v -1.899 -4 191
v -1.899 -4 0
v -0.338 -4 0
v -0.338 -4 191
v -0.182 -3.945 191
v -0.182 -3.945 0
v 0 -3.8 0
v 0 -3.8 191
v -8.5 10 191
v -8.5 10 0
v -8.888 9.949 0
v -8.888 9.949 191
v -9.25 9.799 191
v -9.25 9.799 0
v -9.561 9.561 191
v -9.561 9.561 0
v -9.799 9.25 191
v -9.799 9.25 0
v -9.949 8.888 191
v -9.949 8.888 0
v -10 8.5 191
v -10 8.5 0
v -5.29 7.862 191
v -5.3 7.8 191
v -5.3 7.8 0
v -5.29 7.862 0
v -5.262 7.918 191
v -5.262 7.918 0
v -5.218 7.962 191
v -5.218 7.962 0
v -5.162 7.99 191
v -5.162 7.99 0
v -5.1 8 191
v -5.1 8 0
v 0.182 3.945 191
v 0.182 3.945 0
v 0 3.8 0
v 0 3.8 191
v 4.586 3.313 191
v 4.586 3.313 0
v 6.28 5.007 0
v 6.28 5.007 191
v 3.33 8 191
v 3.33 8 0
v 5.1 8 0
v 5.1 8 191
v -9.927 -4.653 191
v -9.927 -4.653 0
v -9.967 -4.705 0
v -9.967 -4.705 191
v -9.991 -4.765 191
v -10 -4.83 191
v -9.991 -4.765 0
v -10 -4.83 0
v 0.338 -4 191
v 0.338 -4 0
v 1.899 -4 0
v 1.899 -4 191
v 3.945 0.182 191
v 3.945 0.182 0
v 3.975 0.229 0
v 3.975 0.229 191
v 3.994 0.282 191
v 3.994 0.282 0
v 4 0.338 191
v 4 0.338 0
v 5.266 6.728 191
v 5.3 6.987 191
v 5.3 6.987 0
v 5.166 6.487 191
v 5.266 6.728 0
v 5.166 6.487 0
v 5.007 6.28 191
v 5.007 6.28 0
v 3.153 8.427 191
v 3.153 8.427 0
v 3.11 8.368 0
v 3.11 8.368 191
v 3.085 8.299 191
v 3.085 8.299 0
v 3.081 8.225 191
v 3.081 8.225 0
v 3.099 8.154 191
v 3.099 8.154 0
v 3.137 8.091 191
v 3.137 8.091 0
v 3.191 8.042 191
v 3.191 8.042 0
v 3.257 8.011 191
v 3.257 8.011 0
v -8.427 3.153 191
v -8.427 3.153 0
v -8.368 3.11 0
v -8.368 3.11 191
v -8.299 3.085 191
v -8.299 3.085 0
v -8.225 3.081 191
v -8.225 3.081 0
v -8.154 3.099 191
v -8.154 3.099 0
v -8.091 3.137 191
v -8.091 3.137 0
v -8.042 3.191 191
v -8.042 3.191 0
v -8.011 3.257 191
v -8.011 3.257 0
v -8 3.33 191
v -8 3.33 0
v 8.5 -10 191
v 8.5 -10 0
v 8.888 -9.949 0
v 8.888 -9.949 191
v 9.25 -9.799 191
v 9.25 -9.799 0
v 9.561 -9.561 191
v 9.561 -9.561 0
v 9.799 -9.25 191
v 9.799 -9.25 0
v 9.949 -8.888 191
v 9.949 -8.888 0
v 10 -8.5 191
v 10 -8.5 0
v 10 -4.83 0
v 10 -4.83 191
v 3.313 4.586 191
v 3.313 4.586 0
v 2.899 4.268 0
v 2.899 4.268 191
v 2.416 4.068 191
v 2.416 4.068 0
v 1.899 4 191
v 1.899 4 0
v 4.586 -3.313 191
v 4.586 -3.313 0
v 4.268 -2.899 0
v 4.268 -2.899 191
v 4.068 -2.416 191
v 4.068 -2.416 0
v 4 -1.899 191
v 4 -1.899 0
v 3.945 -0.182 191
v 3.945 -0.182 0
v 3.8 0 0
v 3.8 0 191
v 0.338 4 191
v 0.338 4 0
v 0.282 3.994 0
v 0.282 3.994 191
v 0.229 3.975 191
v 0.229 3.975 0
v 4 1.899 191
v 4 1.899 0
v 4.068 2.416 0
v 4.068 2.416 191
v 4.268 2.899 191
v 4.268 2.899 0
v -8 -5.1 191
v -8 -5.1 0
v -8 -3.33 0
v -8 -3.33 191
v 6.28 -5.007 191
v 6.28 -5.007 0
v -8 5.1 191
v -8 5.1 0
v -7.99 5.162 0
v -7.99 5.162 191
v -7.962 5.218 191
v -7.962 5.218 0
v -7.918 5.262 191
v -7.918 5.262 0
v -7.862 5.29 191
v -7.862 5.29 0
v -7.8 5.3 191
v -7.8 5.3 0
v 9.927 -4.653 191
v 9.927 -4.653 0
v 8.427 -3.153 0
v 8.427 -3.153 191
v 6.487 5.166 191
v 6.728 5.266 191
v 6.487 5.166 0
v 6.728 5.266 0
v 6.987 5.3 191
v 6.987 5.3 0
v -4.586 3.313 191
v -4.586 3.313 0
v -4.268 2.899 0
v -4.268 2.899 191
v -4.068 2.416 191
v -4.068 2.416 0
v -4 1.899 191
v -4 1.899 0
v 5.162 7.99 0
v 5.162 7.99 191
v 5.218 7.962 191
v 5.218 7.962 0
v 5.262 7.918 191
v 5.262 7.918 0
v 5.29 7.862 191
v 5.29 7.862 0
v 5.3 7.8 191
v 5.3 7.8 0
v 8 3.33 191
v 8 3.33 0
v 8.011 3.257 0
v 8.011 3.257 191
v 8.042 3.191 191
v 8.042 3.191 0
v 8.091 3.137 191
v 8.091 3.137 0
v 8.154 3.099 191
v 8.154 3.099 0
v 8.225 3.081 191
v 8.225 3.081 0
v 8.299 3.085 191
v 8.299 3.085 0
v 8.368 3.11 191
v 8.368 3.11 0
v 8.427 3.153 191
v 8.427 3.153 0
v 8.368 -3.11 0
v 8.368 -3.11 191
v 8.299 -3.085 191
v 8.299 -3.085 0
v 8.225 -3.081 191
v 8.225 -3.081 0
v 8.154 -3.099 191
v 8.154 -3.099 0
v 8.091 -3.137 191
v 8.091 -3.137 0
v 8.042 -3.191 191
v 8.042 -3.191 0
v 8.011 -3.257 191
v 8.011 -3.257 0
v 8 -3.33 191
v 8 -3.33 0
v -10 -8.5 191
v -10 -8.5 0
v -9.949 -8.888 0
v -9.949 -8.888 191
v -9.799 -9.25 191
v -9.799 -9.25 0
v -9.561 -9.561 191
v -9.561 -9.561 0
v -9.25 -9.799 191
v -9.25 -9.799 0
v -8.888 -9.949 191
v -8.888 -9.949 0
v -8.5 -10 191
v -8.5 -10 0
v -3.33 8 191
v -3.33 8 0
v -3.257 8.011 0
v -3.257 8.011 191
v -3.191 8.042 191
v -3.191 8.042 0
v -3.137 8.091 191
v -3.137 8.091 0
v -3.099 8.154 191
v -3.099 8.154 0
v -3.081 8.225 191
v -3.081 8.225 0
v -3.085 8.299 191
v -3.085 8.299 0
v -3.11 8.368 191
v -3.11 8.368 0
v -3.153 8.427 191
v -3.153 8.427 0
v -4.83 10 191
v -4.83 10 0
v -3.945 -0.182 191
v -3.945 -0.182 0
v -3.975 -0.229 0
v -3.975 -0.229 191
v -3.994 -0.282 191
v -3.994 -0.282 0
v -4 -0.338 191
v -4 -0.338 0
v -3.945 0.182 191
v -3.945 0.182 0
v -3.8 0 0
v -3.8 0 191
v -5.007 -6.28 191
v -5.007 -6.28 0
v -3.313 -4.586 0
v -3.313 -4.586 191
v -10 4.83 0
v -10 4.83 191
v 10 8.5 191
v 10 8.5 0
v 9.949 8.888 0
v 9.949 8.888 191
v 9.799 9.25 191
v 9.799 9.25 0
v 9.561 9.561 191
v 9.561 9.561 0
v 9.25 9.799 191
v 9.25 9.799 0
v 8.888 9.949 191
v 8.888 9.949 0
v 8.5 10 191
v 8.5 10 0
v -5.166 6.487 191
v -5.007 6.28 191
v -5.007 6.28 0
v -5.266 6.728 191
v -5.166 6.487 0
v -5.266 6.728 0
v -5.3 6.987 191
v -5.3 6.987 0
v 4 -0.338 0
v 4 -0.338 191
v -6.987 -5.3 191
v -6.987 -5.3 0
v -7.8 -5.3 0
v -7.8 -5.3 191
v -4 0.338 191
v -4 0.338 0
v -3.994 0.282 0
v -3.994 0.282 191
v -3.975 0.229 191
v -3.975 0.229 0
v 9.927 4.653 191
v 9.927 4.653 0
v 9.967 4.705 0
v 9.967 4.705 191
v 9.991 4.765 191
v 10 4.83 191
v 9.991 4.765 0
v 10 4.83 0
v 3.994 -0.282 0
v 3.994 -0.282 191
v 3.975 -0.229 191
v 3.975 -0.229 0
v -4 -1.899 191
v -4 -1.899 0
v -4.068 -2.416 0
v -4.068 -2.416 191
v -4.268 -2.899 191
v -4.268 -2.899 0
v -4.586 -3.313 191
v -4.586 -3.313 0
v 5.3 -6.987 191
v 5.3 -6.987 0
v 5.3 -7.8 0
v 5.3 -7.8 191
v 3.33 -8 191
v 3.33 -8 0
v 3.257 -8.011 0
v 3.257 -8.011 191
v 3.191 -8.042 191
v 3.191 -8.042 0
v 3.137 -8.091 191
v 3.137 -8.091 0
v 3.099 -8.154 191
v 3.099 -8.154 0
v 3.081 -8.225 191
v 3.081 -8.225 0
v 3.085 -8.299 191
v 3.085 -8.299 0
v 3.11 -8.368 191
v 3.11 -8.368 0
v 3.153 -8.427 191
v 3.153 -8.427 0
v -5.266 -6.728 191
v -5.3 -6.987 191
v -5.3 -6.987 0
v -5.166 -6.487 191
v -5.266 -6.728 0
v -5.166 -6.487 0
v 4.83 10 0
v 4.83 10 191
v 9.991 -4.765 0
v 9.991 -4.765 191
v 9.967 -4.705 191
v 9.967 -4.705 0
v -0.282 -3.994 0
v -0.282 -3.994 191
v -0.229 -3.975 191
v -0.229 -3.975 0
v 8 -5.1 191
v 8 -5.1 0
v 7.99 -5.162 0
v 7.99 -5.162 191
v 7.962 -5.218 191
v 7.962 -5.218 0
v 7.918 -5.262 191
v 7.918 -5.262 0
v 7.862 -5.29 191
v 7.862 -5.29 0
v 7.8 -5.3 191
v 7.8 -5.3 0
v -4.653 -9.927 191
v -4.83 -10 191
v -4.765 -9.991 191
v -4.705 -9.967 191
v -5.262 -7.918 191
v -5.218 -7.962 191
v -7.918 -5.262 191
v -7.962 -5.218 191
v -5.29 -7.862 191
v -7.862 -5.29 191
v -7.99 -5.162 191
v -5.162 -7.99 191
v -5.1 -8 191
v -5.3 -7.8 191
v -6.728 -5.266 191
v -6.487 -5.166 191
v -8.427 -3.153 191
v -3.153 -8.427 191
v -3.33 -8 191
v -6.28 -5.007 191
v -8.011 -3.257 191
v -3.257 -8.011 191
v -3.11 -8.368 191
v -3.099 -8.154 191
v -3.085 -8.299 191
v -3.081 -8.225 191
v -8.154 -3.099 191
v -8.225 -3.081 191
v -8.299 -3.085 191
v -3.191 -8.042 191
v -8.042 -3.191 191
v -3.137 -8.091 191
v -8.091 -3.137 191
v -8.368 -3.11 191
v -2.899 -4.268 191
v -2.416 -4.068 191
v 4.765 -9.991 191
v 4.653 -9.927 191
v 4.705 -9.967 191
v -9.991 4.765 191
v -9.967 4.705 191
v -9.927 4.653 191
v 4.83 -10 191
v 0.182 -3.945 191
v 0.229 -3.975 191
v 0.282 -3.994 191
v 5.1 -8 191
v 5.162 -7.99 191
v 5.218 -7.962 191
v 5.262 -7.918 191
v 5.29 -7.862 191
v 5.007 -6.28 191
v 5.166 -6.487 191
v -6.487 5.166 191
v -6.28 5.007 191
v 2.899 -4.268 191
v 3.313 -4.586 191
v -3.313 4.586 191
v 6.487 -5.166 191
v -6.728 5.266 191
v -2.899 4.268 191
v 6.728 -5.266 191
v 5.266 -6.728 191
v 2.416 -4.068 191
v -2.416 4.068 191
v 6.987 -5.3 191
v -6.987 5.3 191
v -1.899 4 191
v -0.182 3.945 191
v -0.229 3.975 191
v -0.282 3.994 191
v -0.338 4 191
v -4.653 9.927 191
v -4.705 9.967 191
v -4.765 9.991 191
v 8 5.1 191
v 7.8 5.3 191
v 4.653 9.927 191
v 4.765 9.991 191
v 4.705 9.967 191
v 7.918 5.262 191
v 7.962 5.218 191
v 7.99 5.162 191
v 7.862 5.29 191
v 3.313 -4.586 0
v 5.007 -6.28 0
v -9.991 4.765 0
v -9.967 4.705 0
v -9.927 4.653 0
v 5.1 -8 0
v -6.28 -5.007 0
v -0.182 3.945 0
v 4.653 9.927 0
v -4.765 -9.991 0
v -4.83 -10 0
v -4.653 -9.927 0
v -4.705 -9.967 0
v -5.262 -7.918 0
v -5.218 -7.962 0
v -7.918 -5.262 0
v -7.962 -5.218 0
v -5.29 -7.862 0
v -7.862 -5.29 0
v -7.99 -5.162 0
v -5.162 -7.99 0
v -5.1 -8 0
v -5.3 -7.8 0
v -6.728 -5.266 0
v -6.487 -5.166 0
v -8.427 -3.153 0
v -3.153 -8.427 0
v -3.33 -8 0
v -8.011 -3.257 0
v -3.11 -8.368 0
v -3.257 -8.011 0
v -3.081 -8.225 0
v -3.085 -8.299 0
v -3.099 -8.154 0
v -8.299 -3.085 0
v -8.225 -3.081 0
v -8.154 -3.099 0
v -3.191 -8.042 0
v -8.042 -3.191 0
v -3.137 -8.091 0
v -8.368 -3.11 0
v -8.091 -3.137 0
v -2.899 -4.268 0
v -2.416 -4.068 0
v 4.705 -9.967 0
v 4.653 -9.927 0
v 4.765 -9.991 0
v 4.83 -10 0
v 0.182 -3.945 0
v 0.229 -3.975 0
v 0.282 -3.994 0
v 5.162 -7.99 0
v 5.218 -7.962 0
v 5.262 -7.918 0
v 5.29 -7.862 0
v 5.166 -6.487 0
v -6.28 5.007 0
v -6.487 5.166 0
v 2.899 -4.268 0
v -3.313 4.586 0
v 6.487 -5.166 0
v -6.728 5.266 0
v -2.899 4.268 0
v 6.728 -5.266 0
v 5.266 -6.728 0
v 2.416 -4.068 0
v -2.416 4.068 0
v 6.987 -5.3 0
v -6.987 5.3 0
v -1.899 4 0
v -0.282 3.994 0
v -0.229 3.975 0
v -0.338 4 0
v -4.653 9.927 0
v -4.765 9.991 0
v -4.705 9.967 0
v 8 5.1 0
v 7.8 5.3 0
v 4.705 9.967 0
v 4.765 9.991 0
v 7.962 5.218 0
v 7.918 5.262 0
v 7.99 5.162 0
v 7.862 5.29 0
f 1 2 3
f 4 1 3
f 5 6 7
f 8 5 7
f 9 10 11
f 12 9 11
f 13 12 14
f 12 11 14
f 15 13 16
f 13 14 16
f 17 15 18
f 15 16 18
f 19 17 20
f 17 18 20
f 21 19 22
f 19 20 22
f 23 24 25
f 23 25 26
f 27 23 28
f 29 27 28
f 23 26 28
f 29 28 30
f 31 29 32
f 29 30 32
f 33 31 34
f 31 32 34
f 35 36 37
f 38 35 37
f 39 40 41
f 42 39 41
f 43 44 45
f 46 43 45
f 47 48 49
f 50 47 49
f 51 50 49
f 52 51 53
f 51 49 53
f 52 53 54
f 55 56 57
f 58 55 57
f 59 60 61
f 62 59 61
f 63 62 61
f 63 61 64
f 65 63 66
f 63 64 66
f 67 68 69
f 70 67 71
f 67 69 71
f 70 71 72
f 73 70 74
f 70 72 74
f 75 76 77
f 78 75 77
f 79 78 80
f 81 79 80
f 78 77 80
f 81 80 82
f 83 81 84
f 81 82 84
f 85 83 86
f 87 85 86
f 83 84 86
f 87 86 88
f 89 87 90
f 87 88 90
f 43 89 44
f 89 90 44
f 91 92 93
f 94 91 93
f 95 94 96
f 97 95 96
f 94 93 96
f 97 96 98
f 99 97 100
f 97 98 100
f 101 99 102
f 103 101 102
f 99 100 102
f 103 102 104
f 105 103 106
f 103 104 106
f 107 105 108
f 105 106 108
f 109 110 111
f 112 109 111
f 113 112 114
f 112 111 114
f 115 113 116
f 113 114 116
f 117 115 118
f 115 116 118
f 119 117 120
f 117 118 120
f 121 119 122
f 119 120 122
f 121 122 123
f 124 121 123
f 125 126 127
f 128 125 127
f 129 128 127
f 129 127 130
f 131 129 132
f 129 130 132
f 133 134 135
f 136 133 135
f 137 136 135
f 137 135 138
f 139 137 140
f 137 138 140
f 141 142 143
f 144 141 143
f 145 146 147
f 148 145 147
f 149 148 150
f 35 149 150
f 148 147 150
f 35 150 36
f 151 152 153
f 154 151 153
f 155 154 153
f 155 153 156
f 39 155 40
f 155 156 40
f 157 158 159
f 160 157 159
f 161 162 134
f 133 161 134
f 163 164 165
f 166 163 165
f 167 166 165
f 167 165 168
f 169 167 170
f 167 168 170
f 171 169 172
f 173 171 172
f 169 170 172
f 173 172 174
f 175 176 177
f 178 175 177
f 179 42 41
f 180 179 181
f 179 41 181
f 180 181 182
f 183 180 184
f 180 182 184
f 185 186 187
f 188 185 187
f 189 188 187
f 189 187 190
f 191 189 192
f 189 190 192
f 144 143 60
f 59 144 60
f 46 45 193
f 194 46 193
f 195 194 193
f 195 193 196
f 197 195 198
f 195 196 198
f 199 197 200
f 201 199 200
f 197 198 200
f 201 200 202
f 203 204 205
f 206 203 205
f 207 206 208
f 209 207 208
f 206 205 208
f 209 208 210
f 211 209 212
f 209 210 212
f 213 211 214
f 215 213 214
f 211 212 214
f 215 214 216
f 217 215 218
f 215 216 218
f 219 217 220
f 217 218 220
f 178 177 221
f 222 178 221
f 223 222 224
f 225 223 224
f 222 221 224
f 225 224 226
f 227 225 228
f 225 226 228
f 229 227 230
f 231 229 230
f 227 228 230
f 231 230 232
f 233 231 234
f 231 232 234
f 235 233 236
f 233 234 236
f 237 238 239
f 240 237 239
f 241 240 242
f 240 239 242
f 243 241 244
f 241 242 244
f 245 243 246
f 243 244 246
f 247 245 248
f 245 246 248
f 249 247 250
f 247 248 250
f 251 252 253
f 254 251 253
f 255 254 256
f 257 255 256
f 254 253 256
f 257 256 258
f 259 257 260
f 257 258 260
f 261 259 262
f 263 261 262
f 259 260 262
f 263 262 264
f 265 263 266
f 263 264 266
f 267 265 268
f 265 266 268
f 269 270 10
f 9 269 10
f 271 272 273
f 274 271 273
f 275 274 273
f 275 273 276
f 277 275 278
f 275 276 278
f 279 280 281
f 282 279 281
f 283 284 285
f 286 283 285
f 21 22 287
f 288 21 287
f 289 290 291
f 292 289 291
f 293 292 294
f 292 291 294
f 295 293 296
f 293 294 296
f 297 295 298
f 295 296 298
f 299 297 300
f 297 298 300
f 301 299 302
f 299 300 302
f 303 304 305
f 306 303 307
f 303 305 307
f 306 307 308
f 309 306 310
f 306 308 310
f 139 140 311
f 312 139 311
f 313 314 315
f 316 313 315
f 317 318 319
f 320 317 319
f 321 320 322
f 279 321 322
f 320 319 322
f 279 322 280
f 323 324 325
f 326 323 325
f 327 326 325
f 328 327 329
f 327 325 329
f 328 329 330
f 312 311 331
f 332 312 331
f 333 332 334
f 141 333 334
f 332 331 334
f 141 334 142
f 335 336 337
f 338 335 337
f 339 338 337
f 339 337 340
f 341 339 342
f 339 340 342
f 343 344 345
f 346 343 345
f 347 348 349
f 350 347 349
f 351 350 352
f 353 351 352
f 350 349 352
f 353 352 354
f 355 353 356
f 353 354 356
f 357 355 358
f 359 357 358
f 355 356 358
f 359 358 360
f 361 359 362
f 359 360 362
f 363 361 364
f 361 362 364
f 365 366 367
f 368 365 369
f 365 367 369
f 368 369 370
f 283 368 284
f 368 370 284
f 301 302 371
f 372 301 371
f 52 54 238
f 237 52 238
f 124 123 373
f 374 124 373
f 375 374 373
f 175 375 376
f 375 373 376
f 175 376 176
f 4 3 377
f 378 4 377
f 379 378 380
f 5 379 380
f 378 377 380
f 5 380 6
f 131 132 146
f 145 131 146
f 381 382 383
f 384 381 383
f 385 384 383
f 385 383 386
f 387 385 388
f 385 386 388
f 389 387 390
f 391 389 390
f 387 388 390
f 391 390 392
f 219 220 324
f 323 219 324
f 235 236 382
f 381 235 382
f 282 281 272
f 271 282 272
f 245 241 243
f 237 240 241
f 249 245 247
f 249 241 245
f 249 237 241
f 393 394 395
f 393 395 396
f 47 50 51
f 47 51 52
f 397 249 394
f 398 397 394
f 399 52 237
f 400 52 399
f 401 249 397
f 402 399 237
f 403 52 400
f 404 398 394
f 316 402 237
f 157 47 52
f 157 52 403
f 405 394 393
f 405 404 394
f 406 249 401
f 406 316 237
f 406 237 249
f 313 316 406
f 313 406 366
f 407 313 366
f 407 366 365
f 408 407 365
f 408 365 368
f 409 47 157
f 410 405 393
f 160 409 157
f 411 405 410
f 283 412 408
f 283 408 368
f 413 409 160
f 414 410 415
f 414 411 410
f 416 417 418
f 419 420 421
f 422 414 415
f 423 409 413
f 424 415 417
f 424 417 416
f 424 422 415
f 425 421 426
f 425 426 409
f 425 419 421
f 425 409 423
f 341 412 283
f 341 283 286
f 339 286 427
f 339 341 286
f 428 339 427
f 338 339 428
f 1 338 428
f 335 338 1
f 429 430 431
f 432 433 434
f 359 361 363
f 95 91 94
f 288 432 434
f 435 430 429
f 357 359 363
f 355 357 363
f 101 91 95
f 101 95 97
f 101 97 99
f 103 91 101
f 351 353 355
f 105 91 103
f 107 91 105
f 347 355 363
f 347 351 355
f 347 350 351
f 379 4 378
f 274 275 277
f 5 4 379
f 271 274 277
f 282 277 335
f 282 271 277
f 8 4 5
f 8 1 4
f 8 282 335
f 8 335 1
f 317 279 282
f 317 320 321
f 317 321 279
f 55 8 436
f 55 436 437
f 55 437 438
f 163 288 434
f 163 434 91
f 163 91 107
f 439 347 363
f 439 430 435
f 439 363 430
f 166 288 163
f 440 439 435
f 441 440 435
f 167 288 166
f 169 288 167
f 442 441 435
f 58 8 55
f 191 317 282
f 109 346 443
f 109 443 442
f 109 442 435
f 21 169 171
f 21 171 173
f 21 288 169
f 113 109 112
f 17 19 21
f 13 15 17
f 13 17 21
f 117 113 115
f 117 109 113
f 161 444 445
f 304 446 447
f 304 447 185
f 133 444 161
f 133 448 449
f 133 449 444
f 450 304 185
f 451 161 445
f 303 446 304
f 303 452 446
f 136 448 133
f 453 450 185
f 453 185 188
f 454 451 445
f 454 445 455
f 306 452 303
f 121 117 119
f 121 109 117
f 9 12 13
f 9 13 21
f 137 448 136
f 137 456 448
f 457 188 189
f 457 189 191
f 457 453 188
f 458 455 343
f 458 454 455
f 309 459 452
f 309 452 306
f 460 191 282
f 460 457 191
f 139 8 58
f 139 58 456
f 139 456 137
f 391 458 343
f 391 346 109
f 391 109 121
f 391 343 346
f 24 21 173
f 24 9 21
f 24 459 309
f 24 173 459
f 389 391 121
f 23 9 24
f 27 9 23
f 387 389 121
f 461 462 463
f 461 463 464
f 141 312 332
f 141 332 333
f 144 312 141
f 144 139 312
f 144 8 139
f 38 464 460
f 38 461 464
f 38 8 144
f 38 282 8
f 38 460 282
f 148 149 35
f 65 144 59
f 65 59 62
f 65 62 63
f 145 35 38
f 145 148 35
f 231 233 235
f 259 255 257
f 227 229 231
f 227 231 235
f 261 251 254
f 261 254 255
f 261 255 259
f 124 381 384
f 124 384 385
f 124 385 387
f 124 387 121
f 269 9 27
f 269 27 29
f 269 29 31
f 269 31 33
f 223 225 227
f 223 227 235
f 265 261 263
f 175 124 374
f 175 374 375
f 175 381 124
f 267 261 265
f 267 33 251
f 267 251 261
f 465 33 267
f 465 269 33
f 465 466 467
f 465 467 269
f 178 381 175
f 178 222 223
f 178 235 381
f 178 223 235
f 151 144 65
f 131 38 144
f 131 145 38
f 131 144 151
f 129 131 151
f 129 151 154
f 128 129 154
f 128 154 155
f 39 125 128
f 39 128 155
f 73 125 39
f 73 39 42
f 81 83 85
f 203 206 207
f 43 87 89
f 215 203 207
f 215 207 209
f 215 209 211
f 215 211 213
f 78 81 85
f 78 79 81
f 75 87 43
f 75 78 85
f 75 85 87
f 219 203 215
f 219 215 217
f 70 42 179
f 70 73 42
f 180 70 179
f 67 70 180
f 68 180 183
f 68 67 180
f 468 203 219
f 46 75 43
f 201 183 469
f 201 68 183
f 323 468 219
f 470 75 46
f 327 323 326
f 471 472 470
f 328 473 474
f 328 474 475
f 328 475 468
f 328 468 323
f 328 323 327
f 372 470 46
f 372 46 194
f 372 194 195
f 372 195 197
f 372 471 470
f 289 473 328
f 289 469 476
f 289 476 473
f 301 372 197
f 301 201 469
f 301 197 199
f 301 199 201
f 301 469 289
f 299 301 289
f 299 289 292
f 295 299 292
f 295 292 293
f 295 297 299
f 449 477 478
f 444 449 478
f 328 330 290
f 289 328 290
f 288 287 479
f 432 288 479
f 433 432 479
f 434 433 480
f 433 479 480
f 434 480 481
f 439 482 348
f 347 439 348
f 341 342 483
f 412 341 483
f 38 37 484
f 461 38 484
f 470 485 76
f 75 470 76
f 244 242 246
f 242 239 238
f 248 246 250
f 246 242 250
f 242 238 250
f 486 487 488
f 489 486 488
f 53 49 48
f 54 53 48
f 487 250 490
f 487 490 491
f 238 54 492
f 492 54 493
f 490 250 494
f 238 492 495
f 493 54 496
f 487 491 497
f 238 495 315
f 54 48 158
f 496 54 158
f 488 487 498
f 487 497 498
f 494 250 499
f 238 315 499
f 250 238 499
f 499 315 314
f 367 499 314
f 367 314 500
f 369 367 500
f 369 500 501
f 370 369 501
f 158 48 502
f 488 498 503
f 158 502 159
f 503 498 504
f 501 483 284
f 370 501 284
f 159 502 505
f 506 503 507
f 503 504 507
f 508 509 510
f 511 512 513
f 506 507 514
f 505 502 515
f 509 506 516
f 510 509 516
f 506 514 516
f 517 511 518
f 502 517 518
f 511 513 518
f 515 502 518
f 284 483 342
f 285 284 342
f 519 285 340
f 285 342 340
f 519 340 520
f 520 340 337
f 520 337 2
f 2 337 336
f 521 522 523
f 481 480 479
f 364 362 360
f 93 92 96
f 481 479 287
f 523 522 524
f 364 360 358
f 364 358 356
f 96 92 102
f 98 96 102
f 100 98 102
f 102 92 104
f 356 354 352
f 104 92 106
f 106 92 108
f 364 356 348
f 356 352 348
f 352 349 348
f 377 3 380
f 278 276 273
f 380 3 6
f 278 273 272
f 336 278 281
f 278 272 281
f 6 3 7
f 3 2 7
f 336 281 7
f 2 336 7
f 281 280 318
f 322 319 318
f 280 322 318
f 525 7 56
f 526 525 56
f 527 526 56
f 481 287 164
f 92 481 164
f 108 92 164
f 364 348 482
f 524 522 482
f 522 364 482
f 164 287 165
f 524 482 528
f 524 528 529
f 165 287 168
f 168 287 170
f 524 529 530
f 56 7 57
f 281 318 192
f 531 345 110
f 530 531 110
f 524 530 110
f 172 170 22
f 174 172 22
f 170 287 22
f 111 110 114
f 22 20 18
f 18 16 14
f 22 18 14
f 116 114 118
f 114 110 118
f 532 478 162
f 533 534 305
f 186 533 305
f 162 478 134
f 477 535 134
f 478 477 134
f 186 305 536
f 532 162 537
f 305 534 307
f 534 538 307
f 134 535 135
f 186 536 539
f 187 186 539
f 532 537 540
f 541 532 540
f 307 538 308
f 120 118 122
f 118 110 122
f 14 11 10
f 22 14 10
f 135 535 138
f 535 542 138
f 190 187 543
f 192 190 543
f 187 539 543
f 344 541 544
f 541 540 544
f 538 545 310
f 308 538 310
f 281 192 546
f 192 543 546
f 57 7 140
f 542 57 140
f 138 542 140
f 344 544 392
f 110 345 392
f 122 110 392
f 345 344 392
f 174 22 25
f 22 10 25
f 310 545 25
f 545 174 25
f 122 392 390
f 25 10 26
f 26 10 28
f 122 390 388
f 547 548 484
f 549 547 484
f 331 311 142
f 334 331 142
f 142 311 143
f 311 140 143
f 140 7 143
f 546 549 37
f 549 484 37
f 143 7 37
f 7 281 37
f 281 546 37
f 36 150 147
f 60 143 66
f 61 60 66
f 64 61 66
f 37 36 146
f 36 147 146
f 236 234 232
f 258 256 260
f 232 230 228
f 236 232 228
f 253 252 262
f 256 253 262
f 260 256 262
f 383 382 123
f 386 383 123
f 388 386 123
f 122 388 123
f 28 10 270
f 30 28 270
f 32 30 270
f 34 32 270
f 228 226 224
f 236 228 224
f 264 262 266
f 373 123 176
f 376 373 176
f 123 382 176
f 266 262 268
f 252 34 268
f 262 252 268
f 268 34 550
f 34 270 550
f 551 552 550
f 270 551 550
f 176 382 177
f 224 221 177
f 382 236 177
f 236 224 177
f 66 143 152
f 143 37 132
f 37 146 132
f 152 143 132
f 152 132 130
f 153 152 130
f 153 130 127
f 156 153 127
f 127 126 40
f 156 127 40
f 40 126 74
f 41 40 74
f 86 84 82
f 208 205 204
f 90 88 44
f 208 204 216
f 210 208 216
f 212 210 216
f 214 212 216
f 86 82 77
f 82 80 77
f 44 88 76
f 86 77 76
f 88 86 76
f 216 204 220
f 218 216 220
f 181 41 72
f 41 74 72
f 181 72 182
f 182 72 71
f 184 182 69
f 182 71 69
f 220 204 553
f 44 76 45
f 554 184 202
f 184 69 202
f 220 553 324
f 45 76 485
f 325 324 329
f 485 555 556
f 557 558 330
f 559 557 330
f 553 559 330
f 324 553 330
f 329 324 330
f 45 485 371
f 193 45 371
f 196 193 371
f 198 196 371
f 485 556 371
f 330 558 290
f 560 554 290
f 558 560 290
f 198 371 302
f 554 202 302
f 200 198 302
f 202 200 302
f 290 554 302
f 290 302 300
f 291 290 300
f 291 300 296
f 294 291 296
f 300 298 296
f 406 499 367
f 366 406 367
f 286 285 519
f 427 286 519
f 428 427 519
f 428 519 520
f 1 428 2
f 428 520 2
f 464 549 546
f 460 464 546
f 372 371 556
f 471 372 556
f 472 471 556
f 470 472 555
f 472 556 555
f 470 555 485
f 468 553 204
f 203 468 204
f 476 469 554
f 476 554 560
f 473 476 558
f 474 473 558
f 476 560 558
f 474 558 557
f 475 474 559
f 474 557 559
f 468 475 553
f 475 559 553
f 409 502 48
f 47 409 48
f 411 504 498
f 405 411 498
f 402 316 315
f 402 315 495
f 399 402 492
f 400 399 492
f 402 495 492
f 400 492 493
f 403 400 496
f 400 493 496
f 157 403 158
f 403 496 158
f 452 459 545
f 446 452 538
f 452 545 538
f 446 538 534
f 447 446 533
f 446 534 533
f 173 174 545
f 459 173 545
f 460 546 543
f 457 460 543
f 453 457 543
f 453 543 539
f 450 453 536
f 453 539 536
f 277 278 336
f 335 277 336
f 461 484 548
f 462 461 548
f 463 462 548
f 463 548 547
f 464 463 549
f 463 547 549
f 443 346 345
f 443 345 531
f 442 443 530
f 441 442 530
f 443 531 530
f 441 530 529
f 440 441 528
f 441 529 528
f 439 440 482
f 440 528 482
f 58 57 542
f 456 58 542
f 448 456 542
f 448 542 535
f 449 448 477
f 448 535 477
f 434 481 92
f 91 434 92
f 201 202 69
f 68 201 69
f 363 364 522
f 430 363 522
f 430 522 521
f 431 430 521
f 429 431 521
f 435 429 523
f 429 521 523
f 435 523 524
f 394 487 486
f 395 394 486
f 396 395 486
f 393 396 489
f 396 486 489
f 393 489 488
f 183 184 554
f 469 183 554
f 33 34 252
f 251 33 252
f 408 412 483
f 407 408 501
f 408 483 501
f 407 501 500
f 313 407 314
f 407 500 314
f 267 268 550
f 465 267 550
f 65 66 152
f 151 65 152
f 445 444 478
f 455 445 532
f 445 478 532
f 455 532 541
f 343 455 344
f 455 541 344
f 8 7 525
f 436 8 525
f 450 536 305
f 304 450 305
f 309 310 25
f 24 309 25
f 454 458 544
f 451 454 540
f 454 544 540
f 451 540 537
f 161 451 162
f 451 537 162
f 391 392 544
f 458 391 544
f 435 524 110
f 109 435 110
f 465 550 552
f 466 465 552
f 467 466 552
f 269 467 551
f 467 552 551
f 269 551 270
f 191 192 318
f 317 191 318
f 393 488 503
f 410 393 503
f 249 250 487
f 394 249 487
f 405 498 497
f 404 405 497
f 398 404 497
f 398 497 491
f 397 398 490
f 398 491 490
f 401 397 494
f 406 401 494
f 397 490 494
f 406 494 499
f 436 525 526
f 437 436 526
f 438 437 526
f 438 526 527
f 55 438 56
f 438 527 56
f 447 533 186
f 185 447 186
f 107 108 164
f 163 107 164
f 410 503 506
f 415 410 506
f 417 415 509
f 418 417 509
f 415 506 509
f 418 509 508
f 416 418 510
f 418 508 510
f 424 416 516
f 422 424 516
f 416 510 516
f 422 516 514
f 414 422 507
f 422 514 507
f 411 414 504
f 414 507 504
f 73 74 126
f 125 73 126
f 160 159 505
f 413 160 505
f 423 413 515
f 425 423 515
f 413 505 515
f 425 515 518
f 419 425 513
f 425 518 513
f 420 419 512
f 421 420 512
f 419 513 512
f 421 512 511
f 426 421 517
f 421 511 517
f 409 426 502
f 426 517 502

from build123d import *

# Parameters (mm, degrees)
EXTRUDE_1_DEPTH = 191


# Read off the part's stored shape, not the designer's step: 222 Конструкционный профиль 20х20-1-surface1
with BuildPart() as part:
    # Эскиз1 → Бобышка-Вытянуть1 (new body)
    with BuildSketch(Plane.XY):
        with BuildLine():
            Line((-3.945217202, 0.181521503), (-3.8, 0))
            Line((-3.8, 0), (-3.945217202, -0.181521503))
            ThreePointArc((-3.945217202, -0.181521503), (-3.98590708, -0.254943529), (-4, -0.337695265))
            Line((-4, -0.337695265), (-4, -1.898780669))
            ThreePointArc((-4, -1.898780669), (-4.152240935, -2.664147534), (-4.585786438, -3.312994231))
            Line((-4.585786438, -3.312994231), (-6.279898987, -5.007106781))
            ThreePointArc((-6.279898987, -5.007106781), (-6.604322336, -5.223879533), (-6.987005769, -5.3))
            Line((-6.987005769, -5.3), (-7.8, -5.3))
            ThreePointArc((-7.8, -5.3), (-7.941421356, -5.241421356), (-8, -5.1))
            Line((-8, -5.1), (-8, -3.33))
            ThreePointArc((-8, -3.33), (-8.154329142, -3.099030117), (-8.426776695, -3.153223305))
            Line((-8.426776695, -3.153223305), (-9.926776695, -4.653223305))
            ThreePointArc((-9.926776695, -4.653223305), (-9.980969883, -4.734329142), (-10, -4.83))
            Line((-10, -4.83), (-10, -8.5))
            ThreePointArc((-10, -8.5), (-9.560660172, -9.560660172), (-8.5, -10))
            Line((-8.5, -10), (-4.83, -10))
            ThreePointArc((-4.83, -10), (-4.734329142, -9.980969883), (-4.653223305, -9.926776695))
            Line((-4.653223305, -9.926776695), (-3.153223305, -8.426776695))
            ThreePointArc((-3.153223305, -8.426776695), (-3.099030117, -8.154329142), (-3.33, -8))
            Line((-3.33, -8), (-5.1, -8))
            ThreePointArc((-5.1, -8), (-5.241421356, -7.941421356), (-5.3, -7.8))
            Line((-5.3, -7.8), (-5.3, -6.987005769))
            ThreePointArc((-5.3, -6.987005769), (-5.223879533, -6.604322336), (-5.007106781, -6.279898987))
            Line((-5.007106781, -6.279898987), (-3.312994231, -4.585786438))
            ThreePointArc((-3.312994231, -4.585786438), (-2.664147534, -4.152240935), (-1.898780669, -4))
            Line((-1.898780669, -4), (-0.337695265, -4))
            ThreePointArc((-0.337695265, -4), (-0.254943529, -3.98590708), (-0.181521503, -3.945217202))
            Line((-0.181521503, -3.945217202), (0, -3.8))
            Line((0, -3.8), (0.181521503, -3.945217202))
            ThreePointArc((0.181521503, -3.945217202), (0.254943529, -3.98590708), (0.337695265, -4))
            Line((0.337695265, -4), (1.898780669, -4))
            ThreePointArc((1.898780669, -4), (2.664147534, -4.152240935), (3.312994231, -4.585786438))
            Line((3.312994231, -4.585786438), (5.007106781, -6.279898987))
            ThreePointArc((5.007106781, -6.279898987), (5.223879533, -6.604322336), (5.3, -6.987005769))
            Line((5.3, -6.987005769), (5.3, -7.8))
            ThreePointArc((5.3, -7.8), (5.241421356, -7.941421356), (5.1, -8))
            Line((5.1, -8), (3.33, -8))
            ThreePointArc((3.33, -8), (3.099030117, -8.154329142), (3.153223305, -8.426776695))
            Line((3.153223305, -8.426776695), (4.653223305, -9.926776695))
            ThreePointArc((4.653223305, -9.926776695), (4.734329142, -9.980969883), (4.83, -10))
            Line((4.83, -10), (8.5, -10))
            ThreePointArc((8.5, -10), (9.560660172, -9.560660172), (10, -8.5))
            Line((10, -8.5), (10, -4.83))
            ThreePointArc((10, -4.83), (9.980969883, -4.734329142), (9.926776695, -4.653223305))
            Line((9.926776695, -4.653223305), (8.426776695, -3.153223305))
            ThreePointArc((8.426776695, -3.153223305), (8.154329142, -3.099030117), (8, -3.33))
            Line((8, -3.33), (8, -5.1))
            ThreePointArc((8, -5.1), (7.941421356, -5.241421356), (7.8, -5.3))
            Line((7.8, -5.3), (6.987005769, -5.3))
            ThreePointArc((6.987005769, -5.3), (6.604322336, -5.223879533), (6.279898987, -5.007106781))
            Line((6.279898987, -5.007106781), (4.585786438, -3.312994231))
            ThreePointArc((4.585786438, -3.312994231), (4.152240935, -2.664147534), (4, -1.898780669))
            Line((4, -1.898780669), (4, -0.337695265))
            ThreePointArc((4, -0.337695265), (3.98590708, -0.254943529), (3.945217202, -0.181521503))
            Line((3.945217202, -0.181521503), (3.8, 0))
            Line((3.8, 0), (3.945217202, 0.181521503))
            ThreePointArc((3.945217202, 0.181521503), (3.98590708, 0.254943529), (4, 0.337695265))
            Line((4, 0.337695265), (4, 1.898780669))
            ThreePointArc((4, 1.898780669), (4.152240935, 2.664147534), (4.585786438, 3.312994231))
            Line((4.585786438, 3.312994231), (6.279898987, 5.007106781))
            ThreePointArc((6.279898987, 5.007106781), (6.604322336, 5.223879533), (6.987005769, 5.3))
            Line((6.987005769, 5.3), (7.8, 5.3))
            ThreePointArc((7.8, 5.3), (7.941421356, 5.241421356), (8, 5.1))
            Line((8, 5.1), (8, 3.33))
            ThreePointArc((8, 3.33), (8.154329142, 3.099030117), (8.426776695, 3.153223305))
            Line((8.426776695, 3.153223305), (9.926776695, 4.653223305))
            ThreePointArc((9.926776695, 4.653223305), (9.980969883, 4.734329142), (10, 4.83))
            Line((10, 4.83), (10, 8.5))
            ThreePointArc((10, 8.5), (9.560660172, 9.560660172), (8.5, 10))
            Line((8.5, 10), (4.83, 10))
            ThreePointArc((4.83, 10), (4.734329142, 9.980969883), (4.653223305, 9.926776695))
            Line((4.653223305, 9.926776695), (3.153223305, 8.426776695))
            ThreePointArc((3.153223305, 8.426776695), (3.099030117, 8.154329142), (3.33, 8))
            Line((3.33, 8), (5.1, 8))
            ThreePointArc((5.1, 8), (5.241421356, 7.941421356), (5.3, 7.8))
            Line((5.3, 7.8), (5.3, 6.987005769))
            ThreePointArc((5.3, 6.987005769), (5.223879533, 6.604322336), (5.007106781, 6.279898987))
            Line((5.007106781, 6.279898987), (3.312994231, 4.585786438))
            ThreePointArc((3.312994231, 4.585786438), (2.664147534, 4.152240935), (1.898780669, 4))
            Line((1.898780669, 4), (0.337695265, 4))
            ThreePointArc((0.337695265, 4), (0.254943529, 3.98590708), (0.181521503, 3.945217202))
            Line((0.181521503, 3.945217202), (0, 3.8))
            Line((0, 3.8), (-0.181521503, 3.945217202))
            ThreePointArc((-0.181521503, 3.945217202), (-0.254943529, 3.98590708), (-0.337695265, 4))
            Line((-0.337695265, 4), (-1.898780669, 4))
            ThreePointArc((-1.898780669, 4), (-2.664147534, 4.152240935), (-3.312994231, 4.585786438))
            Line((-3.312994231, 4.585786438), (-5.007106781, 6.279898987))
            ThreePointArc((-5.007106781, 6.279898987), (-5.223879533, 6.604322336), (-5.3, 6.987005769))
            Line((-5.3, 6.987005769), (-5.3, 7.8))
            ThreePointArc((-5.3, 7.8), (-5.241421356, 7.941421356), (-5.1, 8))
            Line((-5.1, 8), (-3.33, 8))
            ThreePointArc((-3.33, 8), (-3.099030117, 8.154329142), (-3.153223305, 8.426776695))
            Line((-3.153223305, 8.426776695), (-4.653223305, 9.926776695))
            ThreePointArc((-4.653223305, 9.926776695), (-4.734329142, 9.980969883), (-4.83, 10))
            Line((-4.83, 10), (-8.5, 10))
            ThreePointArc((-8.5, 10), (-9.560660172, 9.560660172), (-10, 8.5))
            Line((-10, 8.5), (-10, 4.83))
            ThreePointArc((-10, 4.83), (-9.980969883, 4.734329142), (-9.926776695, 4.653223305))
            Line((-9.926776695, 4.653223305), (-8.426776695, 3.153223305))
            ThreePointArc((-8.426776695, 3.153223305), (-8.154329142, 3.099030117), (-8, 3.33))
            Line((-8, 3.33), (-8, 5.1))
            ThreePointArc((-8, 5.1), (-7.941421356, 5.241421356), (-7.8, 5.3))
            Line((-7.8, 5.3), (-6.987005769, 5.3))
            ThreePointArc((-6.987005769, 5.3), (-6.604322336, 5.223879533), (-6.279898987, 5.007106781))
            Line((-6.279898987, 5.007106781), (-4.585786438, 3.312994231))
            ThreePointArc((-4.585786438, 3.312994231), (-4.152240935, 2.664147534), (-4, 1.898780669))
            Line((-4, 1.898780669), (-4, 0.337695265))
            ThreePointArc((-4, 0.337695265), (-3.98590708, 0.254943529), (-3.945217202, 0.181521503))
        make_face()
    extrude(amount=EXTRUDE_1_DEPTH)


solid = part.part
